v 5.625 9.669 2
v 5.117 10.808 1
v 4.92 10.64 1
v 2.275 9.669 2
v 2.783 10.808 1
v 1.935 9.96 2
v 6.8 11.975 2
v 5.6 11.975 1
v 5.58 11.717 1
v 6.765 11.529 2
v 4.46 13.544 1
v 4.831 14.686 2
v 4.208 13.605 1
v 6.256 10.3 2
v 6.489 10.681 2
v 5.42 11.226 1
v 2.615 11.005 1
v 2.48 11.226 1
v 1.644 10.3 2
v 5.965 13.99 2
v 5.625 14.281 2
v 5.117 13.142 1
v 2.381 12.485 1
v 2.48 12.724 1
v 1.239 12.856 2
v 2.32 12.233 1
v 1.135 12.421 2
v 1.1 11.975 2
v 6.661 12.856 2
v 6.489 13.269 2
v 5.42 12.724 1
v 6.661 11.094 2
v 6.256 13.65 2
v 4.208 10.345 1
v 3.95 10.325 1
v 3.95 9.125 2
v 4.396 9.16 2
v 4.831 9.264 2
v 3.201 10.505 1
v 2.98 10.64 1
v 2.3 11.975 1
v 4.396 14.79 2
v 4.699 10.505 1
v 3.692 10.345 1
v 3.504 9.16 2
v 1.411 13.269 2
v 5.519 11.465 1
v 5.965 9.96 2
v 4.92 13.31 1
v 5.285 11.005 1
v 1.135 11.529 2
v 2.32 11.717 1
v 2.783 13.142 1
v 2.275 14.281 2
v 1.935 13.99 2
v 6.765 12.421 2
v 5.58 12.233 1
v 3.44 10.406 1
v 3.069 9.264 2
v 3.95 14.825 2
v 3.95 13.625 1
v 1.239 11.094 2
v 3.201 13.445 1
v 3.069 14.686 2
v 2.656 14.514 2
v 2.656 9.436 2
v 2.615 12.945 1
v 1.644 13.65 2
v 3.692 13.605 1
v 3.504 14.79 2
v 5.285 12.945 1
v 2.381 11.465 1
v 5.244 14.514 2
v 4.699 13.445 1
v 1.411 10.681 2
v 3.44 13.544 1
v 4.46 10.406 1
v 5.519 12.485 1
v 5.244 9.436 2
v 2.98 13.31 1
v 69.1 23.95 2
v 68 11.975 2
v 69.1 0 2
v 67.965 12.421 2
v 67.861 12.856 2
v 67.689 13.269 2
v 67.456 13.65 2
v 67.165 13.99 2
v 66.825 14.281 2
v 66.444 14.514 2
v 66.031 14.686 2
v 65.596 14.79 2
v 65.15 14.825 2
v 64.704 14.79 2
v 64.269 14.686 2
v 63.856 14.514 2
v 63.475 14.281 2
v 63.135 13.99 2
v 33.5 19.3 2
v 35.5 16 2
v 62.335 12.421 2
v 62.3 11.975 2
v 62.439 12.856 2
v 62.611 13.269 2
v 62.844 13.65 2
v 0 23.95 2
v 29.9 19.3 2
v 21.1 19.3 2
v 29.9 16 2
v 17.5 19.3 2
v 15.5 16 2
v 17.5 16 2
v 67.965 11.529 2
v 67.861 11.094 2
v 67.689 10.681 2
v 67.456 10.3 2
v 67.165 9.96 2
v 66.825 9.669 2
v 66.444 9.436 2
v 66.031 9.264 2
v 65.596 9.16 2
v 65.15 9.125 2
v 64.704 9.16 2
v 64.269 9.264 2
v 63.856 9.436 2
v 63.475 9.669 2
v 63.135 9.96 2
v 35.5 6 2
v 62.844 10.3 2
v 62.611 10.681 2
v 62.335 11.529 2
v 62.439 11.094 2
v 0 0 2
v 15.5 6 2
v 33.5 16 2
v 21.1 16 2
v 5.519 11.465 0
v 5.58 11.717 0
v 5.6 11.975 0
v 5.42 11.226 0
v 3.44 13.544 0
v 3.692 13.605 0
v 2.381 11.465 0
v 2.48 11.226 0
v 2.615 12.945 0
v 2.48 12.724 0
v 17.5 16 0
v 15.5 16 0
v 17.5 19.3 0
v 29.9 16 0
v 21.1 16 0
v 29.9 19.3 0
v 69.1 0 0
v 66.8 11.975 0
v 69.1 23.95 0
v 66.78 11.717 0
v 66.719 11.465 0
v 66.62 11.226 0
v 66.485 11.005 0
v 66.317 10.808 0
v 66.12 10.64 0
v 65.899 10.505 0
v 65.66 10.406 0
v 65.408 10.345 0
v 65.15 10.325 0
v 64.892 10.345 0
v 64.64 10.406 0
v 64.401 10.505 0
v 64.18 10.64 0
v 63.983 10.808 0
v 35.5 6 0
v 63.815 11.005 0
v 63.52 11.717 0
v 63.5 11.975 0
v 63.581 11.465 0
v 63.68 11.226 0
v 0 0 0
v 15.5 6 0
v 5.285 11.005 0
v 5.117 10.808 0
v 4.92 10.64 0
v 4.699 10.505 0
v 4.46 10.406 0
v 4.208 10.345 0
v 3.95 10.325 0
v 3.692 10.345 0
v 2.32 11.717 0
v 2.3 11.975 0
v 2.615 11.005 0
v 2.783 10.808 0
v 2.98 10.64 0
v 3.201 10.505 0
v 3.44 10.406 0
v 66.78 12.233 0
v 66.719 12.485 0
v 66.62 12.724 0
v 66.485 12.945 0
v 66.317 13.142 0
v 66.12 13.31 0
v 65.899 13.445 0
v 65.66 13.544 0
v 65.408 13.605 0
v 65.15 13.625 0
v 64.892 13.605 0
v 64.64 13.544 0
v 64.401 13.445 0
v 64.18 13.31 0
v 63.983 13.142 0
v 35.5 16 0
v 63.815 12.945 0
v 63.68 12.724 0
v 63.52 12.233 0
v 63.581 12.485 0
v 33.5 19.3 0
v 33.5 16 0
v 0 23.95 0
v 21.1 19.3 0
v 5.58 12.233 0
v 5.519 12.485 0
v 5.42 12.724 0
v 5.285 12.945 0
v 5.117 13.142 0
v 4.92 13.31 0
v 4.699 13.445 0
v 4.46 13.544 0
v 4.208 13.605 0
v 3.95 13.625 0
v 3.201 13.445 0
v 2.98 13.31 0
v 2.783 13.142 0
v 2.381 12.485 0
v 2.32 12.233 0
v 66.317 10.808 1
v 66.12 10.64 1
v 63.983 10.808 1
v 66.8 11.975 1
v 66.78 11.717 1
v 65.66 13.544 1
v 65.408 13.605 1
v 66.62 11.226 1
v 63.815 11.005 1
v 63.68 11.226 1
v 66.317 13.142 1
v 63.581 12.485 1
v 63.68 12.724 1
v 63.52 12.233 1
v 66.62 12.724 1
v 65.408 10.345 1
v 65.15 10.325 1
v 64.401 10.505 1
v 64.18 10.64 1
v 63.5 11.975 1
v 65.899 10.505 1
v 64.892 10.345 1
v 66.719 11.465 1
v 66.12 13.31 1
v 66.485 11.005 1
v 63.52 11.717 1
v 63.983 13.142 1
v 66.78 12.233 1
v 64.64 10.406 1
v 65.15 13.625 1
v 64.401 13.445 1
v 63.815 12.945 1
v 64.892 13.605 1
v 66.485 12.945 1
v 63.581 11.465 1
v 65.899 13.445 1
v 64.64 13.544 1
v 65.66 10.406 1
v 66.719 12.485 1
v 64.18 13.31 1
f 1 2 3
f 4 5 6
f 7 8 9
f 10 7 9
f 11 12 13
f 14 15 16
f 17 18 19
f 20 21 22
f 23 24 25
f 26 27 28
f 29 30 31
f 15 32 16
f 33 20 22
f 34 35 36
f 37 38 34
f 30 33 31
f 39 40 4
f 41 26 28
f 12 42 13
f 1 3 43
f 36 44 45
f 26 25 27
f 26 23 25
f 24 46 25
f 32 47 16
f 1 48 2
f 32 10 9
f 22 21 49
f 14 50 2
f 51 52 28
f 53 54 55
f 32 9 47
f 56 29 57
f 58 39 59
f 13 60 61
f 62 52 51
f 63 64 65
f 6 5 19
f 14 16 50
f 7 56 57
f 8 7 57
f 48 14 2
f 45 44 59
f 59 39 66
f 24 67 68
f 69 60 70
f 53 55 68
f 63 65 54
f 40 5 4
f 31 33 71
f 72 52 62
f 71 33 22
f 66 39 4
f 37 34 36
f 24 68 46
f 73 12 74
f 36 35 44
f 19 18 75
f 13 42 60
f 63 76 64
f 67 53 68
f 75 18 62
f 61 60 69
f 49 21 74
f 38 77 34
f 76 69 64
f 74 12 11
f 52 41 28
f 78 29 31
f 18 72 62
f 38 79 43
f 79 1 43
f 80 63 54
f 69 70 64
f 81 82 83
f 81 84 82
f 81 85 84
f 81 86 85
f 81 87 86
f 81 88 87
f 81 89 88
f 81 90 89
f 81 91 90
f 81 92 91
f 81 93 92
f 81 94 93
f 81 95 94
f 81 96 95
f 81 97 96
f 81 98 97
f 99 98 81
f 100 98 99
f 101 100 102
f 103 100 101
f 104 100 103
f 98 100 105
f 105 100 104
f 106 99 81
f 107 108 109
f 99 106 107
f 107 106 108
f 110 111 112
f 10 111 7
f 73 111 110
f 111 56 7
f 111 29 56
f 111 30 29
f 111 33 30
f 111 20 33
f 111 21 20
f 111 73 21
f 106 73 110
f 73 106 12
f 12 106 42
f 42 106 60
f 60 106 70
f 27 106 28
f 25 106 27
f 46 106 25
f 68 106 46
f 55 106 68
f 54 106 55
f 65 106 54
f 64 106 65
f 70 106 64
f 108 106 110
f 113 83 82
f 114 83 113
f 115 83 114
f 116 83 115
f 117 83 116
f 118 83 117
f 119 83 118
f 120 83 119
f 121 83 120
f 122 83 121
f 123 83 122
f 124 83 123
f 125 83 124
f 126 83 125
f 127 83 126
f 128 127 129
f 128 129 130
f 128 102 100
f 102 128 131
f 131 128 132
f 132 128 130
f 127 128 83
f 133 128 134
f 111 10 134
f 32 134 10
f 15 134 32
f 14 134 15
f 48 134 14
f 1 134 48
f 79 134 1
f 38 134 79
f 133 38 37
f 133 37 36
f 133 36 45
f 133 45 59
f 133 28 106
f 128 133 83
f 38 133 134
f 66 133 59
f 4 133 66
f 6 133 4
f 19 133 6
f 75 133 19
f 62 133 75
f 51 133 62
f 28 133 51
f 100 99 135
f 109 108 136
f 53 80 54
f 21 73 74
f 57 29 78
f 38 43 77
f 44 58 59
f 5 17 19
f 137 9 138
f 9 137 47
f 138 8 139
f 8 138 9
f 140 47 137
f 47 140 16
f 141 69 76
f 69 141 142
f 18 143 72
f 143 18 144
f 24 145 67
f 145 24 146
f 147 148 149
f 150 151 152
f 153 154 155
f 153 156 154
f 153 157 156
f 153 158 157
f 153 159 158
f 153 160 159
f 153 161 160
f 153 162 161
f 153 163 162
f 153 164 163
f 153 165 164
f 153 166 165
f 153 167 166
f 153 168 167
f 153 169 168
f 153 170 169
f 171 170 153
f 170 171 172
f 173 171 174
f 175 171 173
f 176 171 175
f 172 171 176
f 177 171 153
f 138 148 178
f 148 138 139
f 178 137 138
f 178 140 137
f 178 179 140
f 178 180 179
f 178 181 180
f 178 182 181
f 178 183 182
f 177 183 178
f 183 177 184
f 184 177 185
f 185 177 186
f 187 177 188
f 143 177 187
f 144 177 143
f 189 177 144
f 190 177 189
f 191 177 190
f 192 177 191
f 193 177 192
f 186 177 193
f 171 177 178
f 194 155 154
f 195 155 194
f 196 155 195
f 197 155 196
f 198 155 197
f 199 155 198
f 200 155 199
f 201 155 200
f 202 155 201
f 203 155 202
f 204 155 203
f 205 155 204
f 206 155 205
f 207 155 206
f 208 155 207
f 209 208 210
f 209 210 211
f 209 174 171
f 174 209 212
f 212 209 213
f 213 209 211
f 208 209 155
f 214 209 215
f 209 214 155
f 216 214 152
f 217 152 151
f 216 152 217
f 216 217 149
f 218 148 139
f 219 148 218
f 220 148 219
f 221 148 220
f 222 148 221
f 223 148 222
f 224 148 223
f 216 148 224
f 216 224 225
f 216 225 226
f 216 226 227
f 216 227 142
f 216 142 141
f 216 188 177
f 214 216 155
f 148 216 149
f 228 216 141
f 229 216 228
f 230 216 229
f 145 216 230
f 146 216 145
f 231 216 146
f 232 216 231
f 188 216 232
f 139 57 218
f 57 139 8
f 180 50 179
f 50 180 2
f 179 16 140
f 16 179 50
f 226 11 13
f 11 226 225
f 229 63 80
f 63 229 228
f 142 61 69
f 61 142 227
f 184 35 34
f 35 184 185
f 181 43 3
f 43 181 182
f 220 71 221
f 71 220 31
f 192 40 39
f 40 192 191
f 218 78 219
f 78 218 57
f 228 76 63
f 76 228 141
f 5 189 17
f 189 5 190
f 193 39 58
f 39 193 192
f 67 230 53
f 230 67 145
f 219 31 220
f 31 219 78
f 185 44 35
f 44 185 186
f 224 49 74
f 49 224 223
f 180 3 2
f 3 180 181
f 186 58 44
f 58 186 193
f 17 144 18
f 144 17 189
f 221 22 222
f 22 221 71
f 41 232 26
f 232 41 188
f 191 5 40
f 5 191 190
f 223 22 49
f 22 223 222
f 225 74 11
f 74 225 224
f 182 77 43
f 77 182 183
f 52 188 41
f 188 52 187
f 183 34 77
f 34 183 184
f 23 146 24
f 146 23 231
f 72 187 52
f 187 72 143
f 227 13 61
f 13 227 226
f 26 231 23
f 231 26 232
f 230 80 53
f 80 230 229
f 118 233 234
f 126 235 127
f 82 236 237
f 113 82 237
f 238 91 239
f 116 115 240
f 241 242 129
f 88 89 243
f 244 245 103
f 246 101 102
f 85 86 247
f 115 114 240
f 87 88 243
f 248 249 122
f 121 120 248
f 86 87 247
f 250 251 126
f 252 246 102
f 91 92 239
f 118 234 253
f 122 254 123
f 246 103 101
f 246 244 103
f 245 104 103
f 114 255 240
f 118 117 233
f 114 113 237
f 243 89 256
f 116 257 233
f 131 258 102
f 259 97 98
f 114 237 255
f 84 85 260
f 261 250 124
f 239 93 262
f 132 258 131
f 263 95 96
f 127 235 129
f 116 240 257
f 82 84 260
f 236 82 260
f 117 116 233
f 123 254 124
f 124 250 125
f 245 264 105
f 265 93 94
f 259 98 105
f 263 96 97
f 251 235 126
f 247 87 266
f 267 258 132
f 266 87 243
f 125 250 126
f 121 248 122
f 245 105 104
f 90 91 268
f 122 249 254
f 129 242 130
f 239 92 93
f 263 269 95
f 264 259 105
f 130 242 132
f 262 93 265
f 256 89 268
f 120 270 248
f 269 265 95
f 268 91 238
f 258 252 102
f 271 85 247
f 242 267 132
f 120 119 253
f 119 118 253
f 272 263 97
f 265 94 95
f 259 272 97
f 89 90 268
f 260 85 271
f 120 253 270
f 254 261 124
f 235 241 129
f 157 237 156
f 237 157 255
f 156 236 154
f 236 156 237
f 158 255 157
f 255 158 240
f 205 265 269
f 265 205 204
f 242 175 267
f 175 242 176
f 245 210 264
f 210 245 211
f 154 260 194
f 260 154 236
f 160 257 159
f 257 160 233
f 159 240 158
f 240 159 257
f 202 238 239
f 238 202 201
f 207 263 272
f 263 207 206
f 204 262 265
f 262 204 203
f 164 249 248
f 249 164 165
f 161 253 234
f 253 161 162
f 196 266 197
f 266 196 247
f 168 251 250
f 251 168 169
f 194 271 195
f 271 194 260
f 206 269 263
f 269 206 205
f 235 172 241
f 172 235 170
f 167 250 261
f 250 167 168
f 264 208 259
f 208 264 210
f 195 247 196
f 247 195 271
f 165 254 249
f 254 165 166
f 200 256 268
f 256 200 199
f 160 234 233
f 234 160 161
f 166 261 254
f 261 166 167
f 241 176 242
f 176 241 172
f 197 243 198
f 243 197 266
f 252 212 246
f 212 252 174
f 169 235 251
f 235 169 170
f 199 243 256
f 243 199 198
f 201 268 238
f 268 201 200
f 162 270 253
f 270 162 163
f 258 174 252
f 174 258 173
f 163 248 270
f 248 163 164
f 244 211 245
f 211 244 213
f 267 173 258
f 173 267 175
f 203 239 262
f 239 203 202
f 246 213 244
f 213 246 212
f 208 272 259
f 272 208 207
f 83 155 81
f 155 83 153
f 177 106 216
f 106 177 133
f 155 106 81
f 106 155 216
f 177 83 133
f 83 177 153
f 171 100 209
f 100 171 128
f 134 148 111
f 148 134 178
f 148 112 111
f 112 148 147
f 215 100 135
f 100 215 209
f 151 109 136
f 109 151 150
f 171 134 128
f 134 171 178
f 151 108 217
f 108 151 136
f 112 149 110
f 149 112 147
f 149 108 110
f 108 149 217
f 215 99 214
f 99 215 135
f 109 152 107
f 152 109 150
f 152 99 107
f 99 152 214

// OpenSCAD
// -------------- Measurements -----------------
plateWidth = 69.1;
plateHeight = 23.95;
plateThickness = 2;
coutersunkenBoltHoleDistanceSide = 2.3;
coutersunkenBoltHoleDiameter = 3.3;
countersunkenBoltHoleHeight = 1;
countersunkBoltHoleDiameterMin = coutersunkenBoltHoleDiameter;
countersunkBoltHoleDiameterMax = 5.7;

faceplateHoleEdgeLeft = 16;
faceplateHoleEdgeTop = 9.4;
faceplateHoleEdgeRight = 39;
faceplateHoleEdgeBottom = 6.3;

backplateHoleEdgeLeft = 15.5;
backplateHoleEdgeBottom = 6;
backplateHoleWidth = 20;
backplateHoleHeight = 10;
backplateHoleEarsWidth = 3.6;
backplateHoleEarsHeight = 3.3;
backplateHoleEarsDistanceLeft = 2;
backplateHoleEarsDistanceRight = backplateHoleEarsDistanceLeft;

// ------------------ Case --------------------- 

countersunkenBoltCenterDistanceLeftRight = coutersunkenBoltHoleDistanceSide + coutersunkenBoltHoleDiameter/2;
countersunkenBoltCenterDistanceTopBottom = plateHeight/2;

faceplateHoleWidth = plateWidth - (faceplateHoleEdgeLeft + faceplateHoleEdgeRight);
faceplateHoleHeight = plateHeight - (faceplateHoleEdgeTop + faceplateHoleEdgeBottom);

// ------------- Print Settings ----------------

faceplate = false;
$fn = 40;

// ---------------- Modules --------------------

module countersunkBoltHole() {
  union() {
    cylinder(d1=countersunkBoltHoleDiameterMax, d2=countersunkBoltHoleDiameterMin, h=countersunkenBoltHoleHeight, center = false);
    cylinder(d=coutersunkenBoltHoleDiameter, h=plateThickness, center = false);

  }
}

module faceplate() {

  difference() {
    // panel
    cube([plateWidth, plateHeight, plateThickness]);

    // hole

    translate([faceplateHoleEdgeLeft, faceplateHoleEdgeBottom, 0])
      cube([faceplateHoleWidth, faceplateHoleHeight, plateThickness], center=false);

    // countersunken bolt holes
    translate([countersunkenBoltCenterDistanceLeftRight, countersunkenBoltCenterDistanceTopBottom, plateThickness])
      rotate([180, 0, 0])
        countersunkBoltHole();
    translate([plateWidth - countersunkenBoltCenterDistanceLeftRight, countersunkenBoltCenterDistanceTopBottom, plateThickness])
      rotate([180, 0, 0])
        countersunkBoltHole();

  }

}

module backplate() {

  difference() {
    // panel
    cube([plateWidth, plateHeight, plateThickness]);

    // hole
    #translate([backplateHoleEdgeLeft, backplateHoleEdgeBottom, 0])
      cube([backplateHoleWidth, backplateHoleHeight, plateThickness], center=false);

    // "ears"
    #translate([backplateHoleEdgeLeft + backplateHoleEarsDistanceLeft, backplateHoleEdgeBottom + backplateHoleHeight, 0])
      cube([backplateHoleEarsWidth, backplateHoleEarsHeight, plateThickness], center=false);
    #translate([backplateHoleEdgeLeft + backplateHoleWidth - (backplateHoleEarsWidth + backplateHoleEarsDistanceRight), backplateHoleEdgeBottom + backplateHoleHeight, 0])
      cube([backplateHoleEarsWidth, backplateHoleEarsHeight, plateThickness], center=false);

    // countersunken bolt holes
    translate([countersunkenBoltCenterDistanceLeftRight, countersunkenBoltCenterDistanceTopBottom, plateThickness])
      rotate([180, 0, 0])
        countersunkBoltHole();
    translate([plateWidth - countersunkenBoltCenterDistanceLeftRight, countersunkenBoltCenterDistanceTopBottom, plateThickness])
      rotate([180, 0, 0])
        countersunkBoltHole();

  }

}


if (faceplate) {

  faceplate();

} else {

  backplate();

}
